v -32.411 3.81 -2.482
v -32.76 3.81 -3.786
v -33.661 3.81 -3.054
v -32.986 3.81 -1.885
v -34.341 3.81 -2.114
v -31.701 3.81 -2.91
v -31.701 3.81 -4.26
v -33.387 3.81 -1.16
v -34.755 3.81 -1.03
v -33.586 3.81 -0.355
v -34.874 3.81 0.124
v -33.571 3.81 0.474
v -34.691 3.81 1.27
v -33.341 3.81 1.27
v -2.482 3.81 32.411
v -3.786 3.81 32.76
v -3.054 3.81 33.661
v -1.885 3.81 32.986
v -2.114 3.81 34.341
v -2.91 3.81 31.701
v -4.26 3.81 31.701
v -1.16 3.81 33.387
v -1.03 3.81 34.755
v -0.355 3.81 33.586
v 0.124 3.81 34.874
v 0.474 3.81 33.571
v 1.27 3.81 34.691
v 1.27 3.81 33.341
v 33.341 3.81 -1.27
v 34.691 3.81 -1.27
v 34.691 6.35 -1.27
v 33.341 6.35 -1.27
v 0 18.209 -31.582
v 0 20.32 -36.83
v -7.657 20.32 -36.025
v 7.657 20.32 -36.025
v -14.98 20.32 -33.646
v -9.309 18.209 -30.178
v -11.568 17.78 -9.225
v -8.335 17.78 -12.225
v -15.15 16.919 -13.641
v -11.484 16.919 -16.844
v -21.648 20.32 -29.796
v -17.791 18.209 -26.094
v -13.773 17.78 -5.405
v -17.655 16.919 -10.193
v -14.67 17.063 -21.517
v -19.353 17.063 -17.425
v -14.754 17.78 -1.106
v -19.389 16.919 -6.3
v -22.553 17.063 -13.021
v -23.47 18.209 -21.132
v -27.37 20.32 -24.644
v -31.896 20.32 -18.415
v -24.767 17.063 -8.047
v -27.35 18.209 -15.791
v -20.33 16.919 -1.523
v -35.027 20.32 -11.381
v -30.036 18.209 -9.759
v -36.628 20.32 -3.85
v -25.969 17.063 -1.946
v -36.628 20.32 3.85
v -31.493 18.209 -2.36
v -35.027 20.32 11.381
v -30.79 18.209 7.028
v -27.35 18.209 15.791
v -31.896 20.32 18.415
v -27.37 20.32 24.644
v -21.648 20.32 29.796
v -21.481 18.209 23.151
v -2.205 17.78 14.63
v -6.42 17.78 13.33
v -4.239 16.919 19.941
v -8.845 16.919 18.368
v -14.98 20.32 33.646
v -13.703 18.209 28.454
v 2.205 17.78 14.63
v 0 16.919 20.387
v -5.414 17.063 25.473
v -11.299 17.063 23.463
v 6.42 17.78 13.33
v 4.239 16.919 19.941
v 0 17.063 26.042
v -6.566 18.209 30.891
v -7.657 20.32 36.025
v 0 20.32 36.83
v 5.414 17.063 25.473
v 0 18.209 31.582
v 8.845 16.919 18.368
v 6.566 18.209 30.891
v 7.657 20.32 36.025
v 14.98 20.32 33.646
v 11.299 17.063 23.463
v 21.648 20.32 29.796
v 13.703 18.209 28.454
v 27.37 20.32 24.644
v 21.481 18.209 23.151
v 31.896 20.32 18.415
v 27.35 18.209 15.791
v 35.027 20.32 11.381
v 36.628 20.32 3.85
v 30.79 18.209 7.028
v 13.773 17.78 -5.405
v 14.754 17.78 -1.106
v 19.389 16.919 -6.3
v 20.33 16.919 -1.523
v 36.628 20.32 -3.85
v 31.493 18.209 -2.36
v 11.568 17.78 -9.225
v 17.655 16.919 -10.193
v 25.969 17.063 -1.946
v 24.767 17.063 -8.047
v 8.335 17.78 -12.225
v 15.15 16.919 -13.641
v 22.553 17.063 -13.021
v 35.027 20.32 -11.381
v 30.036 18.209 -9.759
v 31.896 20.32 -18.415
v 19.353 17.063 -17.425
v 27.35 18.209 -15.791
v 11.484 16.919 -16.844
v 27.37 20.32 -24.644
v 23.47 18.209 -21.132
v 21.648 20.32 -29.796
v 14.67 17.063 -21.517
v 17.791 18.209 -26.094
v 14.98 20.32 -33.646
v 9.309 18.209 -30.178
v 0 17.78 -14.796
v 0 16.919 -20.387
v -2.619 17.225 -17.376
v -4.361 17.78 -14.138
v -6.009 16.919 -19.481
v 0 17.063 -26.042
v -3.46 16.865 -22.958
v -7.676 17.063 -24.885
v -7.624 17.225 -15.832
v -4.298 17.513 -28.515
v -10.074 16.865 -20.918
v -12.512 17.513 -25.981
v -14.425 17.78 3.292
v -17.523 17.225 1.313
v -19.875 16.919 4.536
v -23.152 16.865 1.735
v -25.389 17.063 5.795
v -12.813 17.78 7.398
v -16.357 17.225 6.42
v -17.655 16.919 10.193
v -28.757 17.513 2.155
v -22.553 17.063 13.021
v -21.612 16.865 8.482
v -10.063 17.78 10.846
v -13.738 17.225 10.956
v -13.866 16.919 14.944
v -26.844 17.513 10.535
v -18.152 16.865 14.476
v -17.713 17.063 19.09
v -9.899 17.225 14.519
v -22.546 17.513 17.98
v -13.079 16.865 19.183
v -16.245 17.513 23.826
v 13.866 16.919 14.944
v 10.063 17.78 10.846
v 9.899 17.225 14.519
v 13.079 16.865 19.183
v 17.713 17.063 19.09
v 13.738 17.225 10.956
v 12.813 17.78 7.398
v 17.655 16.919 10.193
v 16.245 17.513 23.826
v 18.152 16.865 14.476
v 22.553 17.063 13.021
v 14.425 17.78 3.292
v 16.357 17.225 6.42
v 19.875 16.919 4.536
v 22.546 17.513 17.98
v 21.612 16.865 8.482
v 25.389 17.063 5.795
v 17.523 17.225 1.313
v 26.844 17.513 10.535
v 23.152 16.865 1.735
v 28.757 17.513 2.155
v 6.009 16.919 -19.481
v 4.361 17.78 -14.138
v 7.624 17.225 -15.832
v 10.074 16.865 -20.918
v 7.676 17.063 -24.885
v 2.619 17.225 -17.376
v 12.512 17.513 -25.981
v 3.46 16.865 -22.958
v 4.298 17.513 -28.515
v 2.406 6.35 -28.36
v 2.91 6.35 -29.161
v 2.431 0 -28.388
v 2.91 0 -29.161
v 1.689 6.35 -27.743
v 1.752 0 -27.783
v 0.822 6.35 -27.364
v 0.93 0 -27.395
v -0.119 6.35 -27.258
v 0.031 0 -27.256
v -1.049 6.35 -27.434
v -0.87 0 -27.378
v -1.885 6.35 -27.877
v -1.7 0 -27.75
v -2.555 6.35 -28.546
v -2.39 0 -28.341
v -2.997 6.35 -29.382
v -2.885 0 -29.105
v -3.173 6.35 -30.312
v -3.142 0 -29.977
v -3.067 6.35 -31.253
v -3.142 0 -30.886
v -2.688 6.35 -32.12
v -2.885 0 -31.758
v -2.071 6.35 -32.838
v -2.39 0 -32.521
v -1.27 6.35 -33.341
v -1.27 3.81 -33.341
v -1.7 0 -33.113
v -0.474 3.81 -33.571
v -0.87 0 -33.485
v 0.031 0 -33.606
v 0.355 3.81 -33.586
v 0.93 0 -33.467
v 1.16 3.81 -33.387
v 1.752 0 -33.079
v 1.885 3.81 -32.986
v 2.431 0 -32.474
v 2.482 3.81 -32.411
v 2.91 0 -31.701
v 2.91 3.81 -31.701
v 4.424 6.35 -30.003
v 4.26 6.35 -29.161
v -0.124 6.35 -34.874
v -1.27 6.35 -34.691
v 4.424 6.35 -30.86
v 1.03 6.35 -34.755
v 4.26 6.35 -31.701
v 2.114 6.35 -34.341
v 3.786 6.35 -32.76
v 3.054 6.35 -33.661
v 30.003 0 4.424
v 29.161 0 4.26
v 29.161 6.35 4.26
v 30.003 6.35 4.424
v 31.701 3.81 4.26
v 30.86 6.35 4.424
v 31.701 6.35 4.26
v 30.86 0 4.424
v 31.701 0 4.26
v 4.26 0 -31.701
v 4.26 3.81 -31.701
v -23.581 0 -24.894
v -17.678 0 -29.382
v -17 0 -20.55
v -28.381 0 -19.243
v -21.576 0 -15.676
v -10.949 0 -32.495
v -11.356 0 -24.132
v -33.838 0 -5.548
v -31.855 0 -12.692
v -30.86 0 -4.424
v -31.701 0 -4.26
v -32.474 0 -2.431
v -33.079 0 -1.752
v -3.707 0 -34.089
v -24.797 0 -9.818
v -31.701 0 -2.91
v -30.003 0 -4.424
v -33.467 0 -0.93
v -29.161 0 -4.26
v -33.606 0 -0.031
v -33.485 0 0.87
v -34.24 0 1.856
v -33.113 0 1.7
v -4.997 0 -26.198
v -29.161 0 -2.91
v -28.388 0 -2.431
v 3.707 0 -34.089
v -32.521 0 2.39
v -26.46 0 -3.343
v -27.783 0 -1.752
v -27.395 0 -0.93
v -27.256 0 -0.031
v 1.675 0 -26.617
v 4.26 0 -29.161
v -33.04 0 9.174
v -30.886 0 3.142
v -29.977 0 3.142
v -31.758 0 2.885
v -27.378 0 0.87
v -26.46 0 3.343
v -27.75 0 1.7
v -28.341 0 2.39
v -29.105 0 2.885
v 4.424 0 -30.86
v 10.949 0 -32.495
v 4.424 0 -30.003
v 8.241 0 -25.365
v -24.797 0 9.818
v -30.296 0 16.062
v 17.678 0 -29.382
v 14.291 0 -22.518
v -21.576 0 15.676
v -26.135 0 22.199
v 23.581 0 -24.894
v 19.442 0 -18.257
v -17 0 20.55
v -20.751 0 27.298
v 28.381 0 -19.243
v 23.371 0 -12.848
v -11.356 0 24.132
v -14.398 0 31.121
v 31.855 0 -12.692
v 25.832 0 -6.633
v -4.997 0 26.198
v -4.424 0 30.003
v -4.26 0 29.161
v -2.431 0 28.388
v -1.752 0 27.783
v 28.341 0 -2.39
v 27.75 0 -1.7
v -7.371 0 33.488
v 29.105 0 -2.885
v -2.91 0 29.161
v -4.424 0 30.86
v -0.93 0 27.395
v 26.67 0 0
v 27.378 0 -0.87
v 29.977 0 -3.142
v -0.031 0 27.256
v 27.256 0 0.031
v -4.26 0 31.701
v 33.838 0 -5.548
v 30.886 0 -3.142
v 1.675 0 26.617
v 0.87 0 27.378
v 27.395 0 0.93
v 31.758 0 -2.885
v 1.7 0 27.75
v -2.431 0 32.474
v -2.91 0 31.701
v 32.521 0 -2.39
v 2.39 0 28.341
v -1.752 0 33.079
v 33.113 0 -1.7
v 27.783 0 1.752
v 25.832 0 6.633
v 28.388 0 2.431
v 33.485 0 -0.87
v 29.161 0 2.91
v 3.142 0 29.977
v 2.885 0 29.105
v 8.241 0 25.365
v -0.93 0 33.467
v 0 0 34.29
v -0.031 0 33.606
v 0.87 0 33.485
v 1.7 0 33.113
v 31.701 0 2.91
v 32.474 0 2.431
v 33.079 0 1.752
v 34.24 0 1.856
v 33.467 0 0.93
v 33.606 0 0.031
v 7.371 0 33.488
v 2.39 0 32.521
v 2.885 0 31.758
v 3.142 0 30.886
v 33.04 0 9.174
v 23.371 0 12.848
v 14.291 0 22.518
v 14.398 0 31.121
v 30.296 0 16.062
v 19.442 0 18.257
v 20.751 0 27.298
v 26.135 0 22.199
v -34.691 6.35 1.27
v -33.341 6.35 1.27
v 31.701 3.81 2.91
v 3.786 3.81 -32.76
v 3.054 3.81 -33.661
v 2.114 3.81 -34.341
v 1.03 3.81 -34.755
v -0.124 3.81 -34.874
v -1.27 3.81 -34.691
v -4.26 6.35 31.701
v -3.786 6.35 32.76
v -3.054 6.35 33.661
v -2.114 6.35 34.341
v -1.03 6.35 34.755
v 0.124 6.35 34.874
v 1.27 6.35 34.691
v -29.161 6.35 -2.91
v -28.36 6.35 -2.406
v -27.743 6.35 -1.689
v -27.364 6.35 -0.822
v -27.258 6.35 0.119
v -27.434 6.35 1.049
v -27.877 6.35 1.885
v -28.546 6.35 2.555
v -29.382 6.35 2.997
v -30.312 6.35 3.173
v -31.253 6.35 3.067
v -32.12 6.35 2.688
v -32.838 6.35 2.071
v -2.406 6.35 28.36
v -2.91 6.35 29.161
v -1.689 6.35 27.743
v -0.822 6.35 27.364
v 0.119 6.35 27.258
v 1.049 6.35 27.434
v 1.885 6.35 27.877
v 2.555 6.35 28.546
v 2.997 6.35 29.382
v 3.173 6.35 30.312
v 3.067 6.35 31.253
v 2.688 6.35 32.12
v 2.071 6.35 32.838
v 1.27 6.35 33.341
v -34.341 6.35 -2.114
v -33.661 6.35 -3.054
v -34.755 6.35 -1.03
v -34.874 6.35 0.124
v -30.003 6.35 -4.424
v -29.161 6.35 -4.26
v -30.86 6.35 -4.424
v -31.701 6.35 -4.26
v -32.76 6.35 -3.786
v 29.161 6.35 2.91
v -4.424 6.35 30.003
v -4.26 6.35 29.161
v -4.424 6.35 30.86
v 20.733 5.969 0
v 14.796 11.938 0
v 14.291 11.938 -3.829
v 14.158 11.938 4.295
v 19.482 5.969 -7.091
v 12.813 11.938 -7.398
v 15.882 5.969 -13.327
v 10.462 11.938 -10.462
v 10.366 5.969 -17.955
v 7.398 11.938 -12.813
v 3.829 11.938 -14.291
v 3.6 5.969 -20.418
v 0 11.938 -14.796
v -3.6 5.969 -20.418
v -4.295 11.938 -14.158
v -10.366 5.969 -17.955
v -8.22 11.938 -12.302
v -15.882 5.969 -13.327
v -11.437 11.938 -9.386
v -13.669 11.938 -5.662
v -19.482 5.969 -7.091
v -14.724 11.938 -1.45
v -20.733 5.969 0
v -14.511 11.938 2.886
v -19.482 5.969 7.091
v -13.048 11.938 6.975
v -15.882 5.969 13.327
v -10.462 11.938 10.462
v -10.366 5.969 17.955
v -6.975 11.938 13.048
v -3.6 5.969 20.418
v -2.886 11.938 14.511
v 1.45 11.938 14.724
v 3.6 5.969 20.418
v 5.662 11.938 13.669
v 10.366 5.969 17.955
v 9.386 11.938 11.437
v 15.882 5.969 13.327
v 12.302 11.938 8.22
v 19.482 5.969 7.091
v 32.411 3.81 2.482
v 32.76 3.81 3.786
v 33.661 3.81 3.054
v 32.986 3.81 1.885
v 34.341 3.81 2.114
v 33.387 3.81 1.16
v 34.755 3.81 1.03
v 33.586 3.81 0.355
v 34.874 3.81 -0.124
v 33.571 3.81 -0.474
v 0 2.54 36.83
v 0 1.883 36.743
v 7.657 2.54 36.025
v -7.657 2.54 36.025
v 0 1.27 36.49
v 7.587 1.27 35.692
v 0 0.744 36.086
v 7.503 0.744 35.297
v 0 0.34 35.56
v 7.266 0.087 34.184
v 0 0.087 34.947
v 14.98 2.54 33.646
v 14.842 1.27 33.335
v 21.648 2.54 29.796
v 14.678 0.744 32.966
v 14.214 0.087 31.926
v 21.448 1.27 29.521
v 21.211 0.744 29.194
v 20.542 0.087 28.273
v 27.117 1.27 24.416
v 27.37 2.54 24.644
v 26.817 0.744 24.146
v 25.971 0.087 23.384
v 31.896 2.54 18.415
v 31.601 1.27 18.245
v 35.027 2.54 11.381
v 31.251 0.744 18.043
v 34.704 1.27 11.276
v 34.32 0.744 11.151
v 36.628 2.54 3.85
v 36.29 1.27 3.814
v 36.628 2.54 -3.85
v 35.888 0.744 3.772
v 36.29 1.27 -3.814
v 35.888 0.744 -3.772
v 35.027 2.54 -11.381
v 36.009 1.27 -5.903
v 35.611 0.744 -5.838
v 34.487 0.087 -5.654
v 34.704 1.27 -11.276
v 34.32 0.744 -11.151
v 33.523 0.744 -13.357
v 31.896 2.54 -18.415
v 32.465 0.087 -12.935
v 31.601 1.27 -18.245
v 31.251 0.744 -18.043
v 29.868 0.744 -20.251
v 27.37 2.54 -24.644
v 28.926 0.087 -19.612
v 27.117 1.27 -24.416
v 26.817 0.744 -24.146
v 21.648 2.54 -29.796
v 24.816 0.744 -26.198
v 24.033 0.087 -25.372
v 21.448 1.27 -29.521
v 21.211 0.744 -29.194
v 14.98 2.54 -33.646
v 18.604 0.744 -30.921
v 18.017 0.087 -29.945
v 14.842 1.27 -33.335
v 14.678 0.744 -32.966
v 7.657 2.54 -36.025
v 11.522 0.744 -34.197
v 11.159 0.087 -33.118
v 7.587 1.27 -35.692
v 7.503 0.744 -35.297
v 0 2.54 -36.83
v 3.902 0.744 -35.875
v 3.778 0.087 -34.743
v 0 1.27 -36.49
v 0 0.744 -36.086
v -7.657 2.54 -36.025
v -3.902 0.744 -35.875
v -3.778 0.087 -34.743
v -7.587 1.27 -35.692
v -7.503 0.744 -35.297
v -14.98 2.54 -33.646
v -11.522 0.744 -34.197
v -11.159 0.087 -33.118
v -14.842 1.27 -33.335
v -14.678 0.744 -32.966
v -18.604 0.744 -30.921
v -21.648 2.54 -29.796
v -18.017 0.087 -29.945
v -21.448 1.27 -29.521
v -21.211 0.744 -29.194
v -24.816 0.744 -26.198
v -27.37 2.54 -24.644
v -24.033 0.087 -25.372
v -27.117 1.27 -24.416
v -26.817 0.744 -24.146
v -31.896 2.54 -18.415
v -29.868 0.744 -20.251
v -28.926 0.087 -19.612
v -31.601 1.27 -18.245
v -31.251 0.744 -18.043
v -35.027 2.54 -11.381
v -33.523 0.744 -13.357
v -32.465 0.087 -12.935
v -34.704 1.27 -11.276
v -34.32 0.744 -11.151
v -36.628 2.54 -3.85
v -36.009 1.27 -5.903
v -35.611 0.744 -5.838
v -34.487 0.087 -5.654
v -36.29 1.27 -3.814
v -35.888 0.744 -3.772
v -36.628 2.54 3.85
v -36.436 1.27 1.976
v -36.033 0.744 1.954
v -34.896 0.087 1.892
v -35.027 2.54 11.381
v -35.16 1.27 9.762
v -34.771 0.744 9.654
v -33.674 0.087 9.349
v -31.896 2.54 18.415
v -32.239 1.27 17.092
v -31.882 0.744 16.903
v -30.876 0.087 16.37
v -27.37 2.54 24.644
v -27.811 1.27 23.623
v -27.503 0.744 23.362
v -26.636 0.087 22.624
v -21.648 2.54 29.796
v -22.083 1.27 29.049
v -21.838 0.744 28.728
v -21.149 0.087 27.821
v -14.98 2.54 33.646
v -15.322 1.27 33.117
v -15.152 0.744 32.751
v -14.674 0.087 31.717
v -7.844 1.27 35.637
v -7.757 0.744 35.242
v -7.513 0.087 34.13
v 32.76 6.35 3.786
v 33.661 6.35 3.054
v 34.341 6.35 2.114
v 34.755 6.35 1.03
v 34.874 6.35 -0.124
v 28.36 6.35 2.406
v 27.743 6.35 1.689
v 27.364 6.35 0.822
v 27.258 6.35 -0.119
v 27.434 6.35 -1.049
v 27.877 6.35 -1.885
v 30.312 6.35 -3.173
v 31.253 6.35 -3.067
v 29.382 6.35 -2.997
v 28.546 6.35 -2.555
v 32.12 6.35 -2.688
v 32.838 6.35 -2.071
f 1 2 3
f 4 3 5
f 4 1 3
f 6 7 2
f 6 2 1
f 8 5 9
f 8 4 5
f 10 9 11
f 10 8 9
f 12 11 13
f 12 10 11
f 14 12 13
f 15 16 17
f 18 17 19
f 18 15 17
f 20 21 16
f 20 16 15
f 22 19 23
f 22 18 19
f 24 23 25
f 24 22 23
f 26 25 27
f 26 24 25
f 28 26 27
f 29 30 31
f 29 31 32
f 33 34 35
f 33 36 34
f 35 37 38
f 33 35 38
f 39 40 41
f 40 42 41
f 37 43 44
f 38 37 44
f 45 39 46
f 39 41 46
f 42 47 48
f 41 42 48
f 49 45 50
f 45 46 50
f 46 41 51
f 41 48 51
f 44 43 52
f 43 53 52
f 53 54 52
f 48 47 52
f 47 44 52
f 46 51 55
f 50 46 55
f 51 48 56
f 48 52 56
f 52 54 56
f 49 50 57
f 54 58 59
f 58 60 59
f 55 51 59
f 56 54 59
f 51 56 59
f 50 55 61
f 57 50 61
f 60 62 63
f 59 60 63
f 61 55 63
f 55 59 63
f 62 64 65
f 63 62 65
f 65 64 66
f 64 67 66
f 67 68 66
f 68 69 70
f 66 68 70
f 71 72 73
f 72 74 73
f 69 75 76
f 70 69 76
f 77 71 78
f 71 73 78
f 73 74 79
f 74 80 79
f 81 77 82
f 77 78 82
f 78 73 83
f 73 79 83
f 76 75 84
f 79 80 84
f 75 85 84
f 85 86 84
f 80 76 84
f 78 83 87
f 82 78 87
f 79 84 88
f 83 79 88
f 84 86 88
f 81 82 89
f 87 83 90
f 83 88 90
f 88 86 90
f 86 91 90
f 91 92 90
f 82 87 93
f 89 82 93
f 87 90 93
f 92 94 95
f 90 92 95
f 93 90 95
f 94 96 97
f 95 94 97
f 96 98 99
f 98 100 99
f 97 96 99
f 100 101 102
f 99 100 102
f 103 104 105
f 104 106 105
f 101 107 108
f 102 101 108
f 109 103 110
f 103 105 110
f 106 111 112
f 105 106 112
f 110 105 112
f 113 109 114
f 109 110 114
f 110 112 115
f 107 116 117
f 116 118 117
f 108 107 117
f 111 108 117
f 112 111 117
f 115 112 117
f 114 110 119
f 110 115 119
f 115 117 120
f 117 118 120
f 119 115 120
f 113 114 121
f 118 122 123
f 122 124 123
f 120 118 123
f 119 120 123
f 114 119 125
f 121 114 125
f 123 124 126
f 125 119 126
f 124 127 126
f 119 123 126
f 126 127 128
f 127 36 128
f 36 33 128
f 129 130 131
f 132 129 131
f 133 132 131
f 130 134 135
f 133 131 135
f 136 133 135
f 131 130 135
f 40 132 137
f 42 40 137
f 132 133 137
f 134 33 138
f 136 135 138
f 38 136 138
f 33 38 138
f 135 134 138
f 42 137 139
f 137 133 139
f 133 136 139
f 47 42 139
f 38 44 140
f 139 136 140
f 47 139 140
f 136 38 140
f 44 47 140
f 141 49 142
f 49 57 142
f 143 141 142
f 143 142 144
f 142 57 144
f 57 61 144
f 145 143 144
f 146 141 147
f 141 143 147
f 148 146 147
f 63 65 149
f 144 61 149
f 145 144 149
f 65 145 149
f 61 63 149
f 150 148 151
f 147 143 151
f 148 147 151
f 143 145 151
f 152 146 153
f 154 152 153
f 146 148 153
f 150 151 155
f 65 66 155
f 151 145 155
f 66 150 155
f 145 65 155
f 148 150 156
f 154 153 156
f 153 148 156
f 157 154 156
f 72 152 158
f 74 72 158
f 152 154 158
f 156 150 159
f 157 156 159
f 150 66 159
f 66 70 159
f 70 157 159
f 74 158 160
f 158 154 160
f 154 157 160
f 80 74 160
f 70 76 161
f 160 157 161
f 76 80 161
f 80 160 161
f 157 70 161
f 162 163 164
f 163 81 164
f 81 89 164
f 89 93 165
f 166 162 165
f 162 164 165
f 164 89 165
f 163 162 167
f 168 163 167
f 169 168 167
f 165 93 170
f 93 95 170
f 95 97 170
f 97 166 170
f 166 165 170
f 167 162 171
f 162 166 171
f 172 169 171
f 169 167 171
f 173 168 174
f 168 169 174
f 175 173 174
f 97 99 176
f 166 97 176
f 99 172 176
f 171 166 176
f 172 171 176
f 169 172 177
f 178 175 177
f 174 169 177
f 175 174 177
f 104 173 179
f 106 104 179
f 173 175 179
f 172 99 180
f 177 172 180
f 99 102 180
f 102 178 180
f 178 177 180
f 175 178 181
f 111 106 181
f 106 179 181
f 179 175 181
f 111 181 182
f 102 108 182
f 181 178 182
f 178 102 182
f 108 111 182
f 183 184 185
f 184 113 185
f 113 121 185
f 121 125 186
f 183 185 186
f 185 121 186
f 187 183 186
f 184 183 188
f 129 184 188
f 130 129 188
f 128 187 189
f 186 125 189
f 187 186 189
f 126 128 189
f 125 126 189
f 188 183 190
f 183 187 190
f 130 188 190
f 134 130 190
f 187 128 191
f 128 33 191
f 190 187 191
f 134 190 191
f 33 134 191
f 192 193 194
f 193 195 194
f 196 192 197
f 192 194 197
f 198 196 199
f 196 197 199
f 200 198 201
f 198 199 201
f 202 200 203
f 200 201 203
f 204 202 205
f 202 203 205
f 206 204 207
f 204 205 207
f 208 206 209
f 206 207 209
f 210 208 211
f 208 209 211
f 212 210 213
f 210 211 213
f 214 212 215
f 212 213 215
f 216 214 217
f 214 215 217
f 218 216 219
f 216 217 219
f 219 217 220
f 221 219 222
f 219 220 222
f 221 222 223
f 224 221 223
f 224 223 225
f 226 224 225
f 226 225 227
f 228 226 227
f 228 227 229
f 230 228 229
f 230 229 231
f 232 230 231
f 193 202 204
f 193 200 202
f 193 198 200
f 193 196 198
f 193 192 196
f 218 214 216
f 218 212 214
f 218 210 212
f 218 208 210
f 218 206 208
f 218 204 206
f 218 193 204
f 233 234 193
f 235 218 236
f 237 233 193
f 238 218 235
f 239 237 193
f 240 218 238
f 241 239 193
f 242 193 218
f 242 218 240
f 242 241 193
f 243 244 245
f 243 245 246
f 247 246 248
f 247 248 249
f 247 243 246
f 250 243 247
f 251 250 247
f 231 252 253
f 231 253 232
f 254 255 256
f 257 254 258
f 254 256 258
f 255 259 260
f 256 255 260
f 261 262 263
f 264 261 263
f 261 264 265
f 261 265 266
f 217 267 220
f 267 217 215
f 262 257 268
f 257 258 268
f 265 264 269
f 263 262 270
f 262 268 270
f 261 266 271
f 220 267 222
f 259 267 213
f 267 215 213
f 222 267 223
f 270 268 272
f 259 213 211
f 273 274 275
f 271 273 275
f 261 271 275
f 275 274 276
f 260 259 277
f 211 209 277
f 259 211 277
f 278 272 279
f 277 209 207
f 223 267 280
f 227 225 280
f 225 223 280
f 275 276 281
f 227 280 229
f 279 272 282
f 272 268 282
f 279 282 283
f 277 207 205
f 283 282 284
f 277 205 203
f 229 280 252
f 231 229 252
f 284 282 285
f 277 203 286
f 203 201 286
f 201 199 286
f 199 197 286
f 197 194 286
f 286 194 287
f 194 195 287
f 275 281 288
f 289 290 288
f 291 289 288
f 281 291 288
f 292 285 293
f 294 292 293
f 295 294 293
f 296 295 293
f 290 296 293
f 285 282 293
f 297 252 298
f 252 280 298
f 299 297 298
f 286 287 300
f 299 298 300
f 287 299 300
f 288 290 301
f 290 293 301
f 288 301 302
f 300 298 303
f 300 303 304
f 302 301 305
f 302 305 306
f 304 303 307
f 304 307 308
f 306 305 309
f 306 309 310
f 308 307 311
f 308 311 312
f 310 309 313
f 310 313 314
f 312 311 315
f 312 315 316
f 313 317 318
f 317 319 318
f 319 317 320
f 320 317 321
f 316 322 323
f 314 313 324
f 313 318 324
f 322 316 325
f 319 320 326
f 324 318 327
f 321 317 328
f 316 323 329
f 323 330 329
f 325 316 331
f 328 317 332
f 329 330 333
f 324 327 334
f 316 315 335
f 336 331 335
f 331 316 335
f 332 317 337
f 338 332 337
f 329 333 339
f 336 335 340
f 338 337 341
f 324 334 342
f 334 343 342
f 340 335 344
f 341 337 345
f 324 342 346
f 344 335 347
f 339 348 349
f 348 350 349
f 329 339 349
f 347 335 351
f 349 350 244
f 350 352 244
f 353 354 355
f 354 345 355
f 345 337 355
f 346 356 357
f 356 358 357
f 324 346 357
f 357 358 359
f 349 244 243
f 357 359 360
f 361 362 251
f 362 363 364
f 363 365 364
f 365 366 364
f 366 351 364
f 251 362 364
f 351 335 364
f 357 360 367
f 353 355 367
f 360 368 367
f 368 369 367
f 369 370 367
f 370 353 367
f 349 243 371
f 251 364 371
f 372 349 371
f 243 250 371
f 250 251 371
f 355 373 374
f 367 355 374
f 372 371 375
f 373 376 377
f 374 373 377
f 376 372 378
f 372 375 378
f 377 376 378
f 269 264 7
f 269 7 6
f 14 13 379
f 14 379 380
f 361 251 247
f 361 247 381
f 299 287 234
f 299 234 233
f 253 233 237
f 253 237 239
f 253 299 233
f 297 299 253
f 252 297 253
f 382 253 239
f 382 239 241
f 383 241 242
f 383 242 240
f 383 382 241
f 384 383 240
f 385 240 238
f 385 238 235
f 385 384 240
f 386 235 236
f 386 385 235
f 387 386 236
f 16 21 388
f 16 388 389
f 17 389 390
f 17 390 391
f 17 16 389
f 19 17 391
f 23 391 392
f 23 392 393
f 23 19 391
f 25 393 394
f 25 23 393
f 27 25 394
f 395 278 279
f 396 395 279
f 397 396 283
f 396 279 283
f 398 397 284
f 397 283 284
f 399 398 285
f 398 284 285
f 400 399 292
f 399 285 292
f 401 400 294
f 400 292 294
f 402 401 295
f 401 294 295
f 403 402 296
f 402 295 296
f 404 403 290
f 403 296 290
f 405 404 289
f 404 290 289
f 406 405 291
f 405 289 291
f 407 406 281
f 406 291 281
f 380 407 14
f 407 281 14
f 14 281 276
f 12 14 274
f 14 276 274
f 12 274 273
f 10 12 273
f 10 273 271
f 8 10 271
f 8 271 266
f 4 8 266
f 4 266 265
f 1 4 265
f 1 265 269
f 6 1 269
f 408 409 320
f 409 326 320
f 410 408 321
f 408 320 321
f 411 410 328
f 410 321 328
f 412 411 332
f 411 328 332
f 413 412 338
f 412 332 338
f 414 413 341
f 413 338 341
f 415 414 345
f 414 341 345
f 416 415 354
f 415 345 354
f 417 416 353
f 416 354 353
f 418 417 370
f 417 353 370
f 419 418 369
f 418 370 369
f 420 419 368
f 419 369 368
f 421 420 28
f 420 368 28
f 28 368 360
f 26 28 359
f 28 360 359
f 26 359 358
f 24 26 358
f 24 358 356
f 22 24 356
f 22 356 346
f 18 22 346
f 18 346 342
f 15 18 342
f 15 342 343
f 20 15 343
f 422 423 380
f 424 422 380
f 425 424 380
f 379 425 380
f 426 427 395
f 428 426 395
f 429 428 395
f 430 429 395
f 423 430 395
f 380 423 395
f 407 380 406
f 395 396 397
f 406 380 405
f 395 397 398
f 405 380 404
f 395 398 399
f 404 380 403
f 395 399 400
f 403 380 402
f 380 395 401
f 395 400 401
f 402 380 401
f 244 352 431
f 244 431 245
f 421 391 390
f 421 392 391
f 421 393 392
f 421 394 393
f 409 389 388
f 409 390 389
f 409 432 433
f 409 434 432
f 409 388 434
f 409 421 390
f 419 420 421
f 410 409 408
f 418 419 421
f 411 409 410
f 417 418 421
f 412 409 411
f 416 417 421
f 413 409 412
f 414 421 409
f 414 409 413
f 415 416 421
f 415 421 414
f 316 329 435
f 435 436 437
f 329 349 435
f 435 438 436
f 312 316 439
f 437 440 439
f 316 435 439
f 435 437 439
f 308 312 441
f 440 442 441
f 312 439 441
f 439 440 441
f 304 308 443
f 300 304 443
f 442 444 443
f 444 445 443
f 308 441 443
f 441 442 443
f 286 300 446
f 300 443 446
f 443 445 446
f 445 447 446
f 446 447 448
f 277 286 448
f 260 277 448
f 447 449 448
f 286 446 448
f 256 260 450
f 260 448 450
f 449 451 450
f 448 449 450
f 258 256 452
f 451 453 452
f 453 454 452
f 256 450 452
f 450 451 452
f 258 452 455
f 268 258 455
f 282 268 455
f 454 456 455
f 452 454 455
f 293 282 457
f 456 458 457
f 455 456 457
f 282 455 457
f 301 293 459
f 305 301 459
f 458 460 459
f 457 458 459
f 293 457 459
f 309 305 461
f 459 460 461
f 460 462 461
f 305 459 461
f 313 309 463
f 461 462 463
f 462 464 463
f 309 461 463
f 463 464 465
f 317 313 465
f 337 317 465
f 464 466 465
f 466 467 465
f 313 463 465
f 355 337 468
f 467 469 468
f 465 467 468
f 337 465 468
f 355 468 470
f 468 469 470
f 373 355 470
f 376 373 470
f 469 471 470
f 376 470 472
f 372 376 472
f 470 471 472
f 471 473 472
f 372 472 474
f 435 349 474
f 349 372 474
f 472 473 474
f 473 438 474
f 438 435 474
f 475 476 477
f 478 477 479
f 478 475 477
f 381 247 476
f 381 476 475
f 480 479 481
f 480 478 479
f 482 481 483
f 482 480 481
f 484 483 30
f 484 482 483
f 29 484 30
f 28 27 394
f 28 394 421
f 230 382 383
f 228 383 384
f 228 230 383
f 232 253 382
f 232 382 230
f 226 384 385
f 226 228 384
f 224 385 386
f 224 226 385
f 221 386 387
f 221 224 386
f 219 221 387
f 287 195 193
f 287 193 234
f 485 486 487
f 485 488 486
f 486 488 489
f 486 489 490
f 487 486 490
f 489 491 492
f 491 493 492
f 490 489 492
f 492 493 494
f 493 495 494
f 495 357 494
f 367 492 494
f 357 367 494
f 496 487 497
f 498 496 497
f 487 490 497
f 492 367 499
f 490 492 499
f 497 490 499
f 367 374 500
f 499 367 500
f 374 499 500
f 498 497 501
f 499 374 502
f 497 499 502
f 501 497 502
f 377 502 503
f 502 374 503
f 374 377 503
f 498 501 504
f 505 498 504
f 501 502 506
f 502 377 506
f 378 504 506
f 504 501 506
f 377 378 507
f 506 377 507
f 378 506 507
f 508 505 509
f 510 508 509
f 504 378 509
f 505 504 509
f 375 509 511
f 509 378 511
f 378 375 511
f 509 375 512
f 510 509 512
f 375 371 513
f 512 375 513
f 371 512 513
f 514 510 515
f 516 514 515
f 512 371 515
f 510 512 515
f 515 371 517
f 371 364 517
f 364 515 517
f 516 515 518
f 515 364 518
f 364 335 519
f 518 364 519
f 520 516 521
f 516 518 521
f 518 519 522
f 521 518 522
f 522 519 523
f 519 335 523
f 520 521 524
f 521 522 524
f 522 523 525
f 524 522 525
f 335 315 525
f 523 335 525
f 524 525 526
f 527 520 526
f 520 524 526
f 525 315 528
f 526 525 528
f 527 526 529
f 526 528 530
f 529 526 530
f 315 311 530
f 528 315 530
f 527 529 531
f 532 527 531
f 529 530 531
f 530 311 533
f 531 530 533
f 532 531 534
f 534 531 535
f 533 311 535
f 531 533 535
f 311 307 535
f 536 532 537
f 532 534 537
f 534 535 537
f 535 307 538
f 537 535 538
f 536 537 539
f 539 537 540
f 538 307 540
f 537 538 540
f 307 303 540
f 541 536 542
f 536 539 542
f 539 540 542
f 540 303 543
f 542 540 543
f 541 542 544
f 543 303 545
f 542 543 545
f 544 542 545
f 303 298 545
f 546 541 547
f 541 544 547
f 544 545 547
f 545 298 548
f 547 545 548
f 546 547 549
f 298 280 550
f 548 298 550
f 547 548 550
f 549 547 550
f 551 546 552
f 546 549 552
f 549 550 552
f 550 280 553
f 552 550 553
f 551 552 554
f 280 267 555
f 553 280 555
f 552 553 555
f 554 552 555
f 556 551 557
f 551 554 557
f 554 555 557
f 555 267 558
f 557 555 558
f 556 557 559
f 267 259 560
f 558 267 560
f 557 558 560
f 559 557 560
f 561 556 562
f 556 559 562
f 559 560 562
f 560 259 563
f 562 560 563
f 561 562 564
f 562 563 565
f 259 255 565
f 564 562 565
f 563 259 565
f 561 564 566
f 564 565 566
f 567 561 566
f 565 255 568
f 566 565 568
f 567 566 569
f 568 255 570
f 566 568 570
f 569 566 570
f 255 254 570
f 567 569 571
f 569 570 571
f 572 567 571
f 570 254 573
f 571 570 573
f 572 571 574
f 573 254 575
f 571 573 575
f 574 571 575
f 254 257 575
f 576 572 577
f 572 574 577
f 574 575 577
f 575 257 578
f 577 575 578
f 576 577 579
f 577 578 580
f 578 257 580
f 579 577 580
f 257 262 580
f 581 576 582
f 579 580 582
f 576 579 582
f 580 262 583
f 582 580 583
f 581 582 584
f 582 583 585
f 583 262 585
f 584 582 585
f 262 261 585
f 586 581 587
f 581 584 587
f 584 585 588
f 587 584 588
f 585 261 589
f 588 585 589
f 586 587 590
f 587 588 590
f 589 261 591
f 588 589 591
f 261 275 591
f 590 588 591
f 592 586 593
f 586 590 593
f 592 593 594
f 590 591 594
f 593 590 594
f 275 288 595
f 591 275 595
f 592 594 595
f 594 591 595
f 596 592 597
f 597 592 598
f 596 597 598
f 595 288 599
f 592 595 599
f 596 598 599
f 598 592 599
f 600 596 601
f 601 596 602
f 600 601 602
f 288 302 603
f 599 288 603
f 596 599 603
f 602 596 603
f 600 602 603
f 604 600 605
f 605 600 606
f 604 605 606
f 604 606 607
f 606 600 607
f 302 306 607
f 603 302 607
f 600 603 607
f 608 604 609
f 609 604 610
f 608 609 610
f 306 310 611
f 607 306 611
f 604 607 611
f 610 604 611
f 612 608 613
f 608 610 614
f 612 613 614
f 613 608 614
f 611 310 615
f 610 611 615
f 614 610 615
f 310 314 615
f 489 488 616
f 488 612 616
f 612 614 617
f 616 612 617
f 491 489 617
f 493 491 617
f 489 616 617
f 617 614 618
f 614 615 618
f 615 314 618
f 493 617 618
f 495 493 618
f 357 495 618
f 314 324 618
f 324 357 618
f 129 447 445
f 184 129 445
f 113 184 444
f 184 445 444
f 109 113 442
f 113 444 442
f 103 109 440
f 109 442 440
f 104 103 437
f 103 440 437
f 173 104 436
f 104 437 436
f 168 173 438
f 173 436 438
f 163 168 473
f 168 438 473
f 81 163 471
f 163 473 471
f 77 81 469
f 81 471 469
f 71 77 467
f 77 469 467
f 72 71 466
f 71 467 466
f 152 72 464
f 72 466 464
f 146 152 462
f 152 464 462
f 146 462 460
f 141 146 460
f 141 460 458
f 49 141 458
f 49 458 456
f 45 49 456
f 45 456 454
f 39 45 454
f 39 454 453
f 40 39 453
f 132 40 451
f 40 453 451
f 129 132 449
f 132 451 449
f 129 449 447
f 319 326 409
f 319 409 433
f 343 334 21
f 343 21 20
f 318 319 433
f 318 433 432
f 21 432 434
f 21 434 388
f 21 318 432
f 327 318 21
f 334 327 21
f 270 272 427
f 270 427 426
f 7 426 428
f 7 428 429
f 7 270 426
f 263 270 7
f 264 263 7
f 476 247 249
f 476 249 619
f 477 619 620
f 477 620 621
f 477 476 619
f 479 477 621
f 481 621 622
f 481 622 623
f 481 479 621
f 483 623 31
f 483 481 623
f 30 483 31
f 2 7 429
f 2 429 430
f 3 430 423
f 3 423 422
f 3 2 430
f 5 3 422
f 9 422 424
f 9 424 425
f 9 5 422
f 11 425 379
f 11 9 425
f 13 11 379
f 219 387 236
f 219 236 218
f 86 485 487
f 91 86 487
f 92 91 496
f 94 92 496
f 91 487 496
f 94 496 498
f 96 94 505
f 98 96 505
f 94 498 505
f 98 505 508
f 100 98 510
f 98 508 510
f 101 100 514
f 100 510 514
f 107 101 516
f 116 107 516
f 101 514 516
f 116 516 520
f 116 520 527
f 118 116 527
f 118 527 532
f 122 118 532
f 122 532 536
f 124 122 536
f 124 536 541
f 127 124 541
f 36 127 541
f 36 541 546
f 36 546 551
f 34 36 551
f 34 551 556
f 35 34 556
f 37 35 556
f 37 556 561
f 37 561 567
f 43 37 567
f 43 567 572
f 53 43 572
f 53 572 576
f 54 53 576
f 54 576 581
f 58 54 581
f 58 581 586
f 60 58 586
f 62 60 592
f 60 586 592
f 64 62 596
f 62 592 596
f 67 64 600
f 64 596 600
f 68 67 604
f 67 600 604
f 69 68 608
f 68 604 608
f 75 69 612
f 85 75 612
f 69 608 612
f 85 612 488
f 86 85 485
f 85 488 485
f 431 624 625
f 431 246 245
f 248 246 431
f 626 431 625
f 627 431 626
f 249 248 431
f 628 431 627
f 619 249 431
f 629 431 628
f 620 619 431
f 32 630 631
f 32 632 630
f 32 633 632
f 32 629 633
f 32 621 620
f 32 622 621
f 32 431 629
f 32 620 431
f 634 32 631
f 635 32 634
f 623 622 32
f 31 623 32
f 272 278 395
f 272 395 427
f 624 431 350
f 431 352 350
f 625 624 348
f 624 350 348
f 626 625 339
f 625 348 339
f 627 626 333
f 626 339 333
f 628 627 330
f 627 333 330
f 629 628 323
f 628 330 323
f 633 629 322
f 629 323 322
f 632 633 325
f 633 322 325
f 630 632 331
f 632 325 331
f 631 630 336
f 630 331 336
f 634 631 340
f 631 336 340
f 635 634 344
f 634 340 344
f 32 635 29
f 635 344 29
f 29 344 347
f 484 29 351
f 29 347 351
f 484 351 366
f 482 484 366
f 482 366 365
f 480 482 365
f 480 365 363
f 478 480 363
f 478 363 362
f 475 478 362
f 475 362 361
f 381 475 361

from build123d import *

# Parameters (mm, degrees)
SKETCH1_R           = 36.83
BOSS_EXTRUDE1_DEPTH = 20.32
FILLET1_R           = 2.54
SKETCH2_R           = 26.67
SKETCH3_R           = 14.7955
SKETCH4_R           = 14.7955
CUT_EXTRUDE1_DEPTH  = 76.2
SKETCH18_R          = 3.175
CUT_EXTRUDE2_DEPTH  = 6.35
CUT_EXTRUDE3_DEPTH  = 6.35
CUT_EXTRUDE4_START  = 2.54
CUT_EXTRUDE4_DEPTH  = 2.54
CIRPATTERN1_COUNT   = 4


with BuildPart() as part:
    # Sketch1 → Boss-Extrude1 (new body)
    with BuildSketch(Plane(origin=(0, 0, 0), x_dir=(1, 0, 0), z_dir=(0, 1, 0))):
        with Locations(Location((0, 0, 0), (0, 0, 270))):
            Circle(SKETCH1_R)
    extrude(amount=BOSS_EXTRUDE1_DEPTH)

    # Fillet1
    fillet1_edges = [part.edges().sort_by_distance(p)[0] for p in [
        (0, 0, -36.83),
    ]]
    fillet(fillet1_edges, radius=FILLET1_R)

    # Sketch2 → Cut-Loft1 section 0
    with BuildSketch(Plane(origin=(0, 0, 0), x_dir=(1, 0, 0), z_dir=(0, 1, 0))):
        Circle(SKETCH2_R)
    # Sketch3 → Cut-Loft1 section 1
    with BuildSketch(Plane(origin=(0, 11.938, 0), x_dir=(1, 0, 0), z_dir=(0, 1, 0))):
        Circle(SKETCH3_R)
    loft(mode=Mode.SUBTRACT)

    # Sketch4 → Cut-Extrude1 (cut)
    with BuildSketch(Plane.XZ.offset(-11.938)):
        with Locations(Location((0, 0, 0), (0, 0, 270))):
            Circle(SKETCH4_R)
    extrude(amount=-CUT_EXTRUDE1_DEPTH, mode=Mode.SUBTRACT)

    # Sketch17 → Cut-Revolve1 (revolve, cut)
    with BuildSketch(Plane(origin=(0, 0, 0), x_dir=(0, 0, -1), z_dir=(1, 0, 0))):
        with BuildLine():
            Line((36.83, 20.32), (14.7955, 20.32))
            Line((14.7955, 20.32), (14.7955, 17.78))
            ThreePointArc((14.7955, 17.78), (26.041766832, 17.063278986), (36.83, 20.32))
        make_face()
    revolve(axis=Axis((0, 0, 0), (0, 1, 0)), mode=Mode.SUBTRACT)

    # Sketch18 → Cut-Extrude2 (cut)
    with BuildSketch(Plane.XZ):
        with Locations(Location((0, 30.431156816, 0), (0, 0, 270))):
            Circle(SKETCH18_R)
        with Locations(Location((-30.431156816, 0, 0), (0, 0, 270))):
            Circle(SKETCH18_R)
        with Locations(Location((0, -30.431156816, 0), (0, 0, 270))):
            Circle(SKETCH18_R)
        with Locations(Location((30.431156816, 0, 0), (0, 0, 270))):
            Circle(SKETCH18_R)
    extrude(amount=-CUT_EXTRUDE2_DEPTH, mode=Mode.SUBTRACT)

    # Sketch19 → Cut-Extrude3 (cut)
    with BuildSketch(Plane.XZ):
        with BuildLine():
            Line((4.259709497, -31.701156816), (2.909935566, -31.701156816))
            ThreePointArc((2.909935566, -31.701156816), (3.175, -30.431156816), (2.909935566, -29.161156816))
            Line((2.909935566, -29.161156816), (4.259709497, -29.161156816))
            ThreePointArc((4.259709497, -29.161156816), (4.445, -30.431156816), (4.259709497, -31.701156816))
        make_face()
    cut_extrude3 = extrude(amount=-CUT_EXTRUDE3_DEPTH, mode=Mode.SUBTRACT)

    # Sketch20 → Cut-Extrude4 (cut)
    with BuildSketch(Plane.XZ.offset(-6.35).offset(CUT_EXTRUDE4_START)):
        with BuildLine():
            Line((-1.27, -34.690866313), (-1.27, -33.341092382))
            ThreePointArc((-1.27, -33.341092382), (1.15960956, -33.3868176), (2.909935566, -31.701156816))
            Line((2.909935566, -31.701156816), (4.259709497, -31.701156816))
            ThreePointArc((4.259709497, -31.701156816), (2.114043859, -34.341251899), (-1.27, -34.690866313))
        make_face()
    cut_extrude4 = extrude(amount=-CUT_EXTRUDE4_DEPTH, mode=Mode.SUBTRACT)

    # CirPattern1: Cut-Extrude3, Cut-Extrude4 ×4 about axis
    cirpattern1_axis = Axis((0, 0, 0), (0, 1, 0))
    add([cut_extrude3.rotate(cirpattern1_axis, i * 360 / CIRPATTERN1_COUNT) for i in range(1, CIRPATTERN1_COUNT)], mode=Mode.SUBTRACT)
    add([cut_extrude4.rotate(cirpattern1_axis, i * 360 / CIRPATTERN1_COUNT) for i in range(1, CIRPATTERN1_COUNT)], mode=Mode.SUBTRACT)


solid = part.part
